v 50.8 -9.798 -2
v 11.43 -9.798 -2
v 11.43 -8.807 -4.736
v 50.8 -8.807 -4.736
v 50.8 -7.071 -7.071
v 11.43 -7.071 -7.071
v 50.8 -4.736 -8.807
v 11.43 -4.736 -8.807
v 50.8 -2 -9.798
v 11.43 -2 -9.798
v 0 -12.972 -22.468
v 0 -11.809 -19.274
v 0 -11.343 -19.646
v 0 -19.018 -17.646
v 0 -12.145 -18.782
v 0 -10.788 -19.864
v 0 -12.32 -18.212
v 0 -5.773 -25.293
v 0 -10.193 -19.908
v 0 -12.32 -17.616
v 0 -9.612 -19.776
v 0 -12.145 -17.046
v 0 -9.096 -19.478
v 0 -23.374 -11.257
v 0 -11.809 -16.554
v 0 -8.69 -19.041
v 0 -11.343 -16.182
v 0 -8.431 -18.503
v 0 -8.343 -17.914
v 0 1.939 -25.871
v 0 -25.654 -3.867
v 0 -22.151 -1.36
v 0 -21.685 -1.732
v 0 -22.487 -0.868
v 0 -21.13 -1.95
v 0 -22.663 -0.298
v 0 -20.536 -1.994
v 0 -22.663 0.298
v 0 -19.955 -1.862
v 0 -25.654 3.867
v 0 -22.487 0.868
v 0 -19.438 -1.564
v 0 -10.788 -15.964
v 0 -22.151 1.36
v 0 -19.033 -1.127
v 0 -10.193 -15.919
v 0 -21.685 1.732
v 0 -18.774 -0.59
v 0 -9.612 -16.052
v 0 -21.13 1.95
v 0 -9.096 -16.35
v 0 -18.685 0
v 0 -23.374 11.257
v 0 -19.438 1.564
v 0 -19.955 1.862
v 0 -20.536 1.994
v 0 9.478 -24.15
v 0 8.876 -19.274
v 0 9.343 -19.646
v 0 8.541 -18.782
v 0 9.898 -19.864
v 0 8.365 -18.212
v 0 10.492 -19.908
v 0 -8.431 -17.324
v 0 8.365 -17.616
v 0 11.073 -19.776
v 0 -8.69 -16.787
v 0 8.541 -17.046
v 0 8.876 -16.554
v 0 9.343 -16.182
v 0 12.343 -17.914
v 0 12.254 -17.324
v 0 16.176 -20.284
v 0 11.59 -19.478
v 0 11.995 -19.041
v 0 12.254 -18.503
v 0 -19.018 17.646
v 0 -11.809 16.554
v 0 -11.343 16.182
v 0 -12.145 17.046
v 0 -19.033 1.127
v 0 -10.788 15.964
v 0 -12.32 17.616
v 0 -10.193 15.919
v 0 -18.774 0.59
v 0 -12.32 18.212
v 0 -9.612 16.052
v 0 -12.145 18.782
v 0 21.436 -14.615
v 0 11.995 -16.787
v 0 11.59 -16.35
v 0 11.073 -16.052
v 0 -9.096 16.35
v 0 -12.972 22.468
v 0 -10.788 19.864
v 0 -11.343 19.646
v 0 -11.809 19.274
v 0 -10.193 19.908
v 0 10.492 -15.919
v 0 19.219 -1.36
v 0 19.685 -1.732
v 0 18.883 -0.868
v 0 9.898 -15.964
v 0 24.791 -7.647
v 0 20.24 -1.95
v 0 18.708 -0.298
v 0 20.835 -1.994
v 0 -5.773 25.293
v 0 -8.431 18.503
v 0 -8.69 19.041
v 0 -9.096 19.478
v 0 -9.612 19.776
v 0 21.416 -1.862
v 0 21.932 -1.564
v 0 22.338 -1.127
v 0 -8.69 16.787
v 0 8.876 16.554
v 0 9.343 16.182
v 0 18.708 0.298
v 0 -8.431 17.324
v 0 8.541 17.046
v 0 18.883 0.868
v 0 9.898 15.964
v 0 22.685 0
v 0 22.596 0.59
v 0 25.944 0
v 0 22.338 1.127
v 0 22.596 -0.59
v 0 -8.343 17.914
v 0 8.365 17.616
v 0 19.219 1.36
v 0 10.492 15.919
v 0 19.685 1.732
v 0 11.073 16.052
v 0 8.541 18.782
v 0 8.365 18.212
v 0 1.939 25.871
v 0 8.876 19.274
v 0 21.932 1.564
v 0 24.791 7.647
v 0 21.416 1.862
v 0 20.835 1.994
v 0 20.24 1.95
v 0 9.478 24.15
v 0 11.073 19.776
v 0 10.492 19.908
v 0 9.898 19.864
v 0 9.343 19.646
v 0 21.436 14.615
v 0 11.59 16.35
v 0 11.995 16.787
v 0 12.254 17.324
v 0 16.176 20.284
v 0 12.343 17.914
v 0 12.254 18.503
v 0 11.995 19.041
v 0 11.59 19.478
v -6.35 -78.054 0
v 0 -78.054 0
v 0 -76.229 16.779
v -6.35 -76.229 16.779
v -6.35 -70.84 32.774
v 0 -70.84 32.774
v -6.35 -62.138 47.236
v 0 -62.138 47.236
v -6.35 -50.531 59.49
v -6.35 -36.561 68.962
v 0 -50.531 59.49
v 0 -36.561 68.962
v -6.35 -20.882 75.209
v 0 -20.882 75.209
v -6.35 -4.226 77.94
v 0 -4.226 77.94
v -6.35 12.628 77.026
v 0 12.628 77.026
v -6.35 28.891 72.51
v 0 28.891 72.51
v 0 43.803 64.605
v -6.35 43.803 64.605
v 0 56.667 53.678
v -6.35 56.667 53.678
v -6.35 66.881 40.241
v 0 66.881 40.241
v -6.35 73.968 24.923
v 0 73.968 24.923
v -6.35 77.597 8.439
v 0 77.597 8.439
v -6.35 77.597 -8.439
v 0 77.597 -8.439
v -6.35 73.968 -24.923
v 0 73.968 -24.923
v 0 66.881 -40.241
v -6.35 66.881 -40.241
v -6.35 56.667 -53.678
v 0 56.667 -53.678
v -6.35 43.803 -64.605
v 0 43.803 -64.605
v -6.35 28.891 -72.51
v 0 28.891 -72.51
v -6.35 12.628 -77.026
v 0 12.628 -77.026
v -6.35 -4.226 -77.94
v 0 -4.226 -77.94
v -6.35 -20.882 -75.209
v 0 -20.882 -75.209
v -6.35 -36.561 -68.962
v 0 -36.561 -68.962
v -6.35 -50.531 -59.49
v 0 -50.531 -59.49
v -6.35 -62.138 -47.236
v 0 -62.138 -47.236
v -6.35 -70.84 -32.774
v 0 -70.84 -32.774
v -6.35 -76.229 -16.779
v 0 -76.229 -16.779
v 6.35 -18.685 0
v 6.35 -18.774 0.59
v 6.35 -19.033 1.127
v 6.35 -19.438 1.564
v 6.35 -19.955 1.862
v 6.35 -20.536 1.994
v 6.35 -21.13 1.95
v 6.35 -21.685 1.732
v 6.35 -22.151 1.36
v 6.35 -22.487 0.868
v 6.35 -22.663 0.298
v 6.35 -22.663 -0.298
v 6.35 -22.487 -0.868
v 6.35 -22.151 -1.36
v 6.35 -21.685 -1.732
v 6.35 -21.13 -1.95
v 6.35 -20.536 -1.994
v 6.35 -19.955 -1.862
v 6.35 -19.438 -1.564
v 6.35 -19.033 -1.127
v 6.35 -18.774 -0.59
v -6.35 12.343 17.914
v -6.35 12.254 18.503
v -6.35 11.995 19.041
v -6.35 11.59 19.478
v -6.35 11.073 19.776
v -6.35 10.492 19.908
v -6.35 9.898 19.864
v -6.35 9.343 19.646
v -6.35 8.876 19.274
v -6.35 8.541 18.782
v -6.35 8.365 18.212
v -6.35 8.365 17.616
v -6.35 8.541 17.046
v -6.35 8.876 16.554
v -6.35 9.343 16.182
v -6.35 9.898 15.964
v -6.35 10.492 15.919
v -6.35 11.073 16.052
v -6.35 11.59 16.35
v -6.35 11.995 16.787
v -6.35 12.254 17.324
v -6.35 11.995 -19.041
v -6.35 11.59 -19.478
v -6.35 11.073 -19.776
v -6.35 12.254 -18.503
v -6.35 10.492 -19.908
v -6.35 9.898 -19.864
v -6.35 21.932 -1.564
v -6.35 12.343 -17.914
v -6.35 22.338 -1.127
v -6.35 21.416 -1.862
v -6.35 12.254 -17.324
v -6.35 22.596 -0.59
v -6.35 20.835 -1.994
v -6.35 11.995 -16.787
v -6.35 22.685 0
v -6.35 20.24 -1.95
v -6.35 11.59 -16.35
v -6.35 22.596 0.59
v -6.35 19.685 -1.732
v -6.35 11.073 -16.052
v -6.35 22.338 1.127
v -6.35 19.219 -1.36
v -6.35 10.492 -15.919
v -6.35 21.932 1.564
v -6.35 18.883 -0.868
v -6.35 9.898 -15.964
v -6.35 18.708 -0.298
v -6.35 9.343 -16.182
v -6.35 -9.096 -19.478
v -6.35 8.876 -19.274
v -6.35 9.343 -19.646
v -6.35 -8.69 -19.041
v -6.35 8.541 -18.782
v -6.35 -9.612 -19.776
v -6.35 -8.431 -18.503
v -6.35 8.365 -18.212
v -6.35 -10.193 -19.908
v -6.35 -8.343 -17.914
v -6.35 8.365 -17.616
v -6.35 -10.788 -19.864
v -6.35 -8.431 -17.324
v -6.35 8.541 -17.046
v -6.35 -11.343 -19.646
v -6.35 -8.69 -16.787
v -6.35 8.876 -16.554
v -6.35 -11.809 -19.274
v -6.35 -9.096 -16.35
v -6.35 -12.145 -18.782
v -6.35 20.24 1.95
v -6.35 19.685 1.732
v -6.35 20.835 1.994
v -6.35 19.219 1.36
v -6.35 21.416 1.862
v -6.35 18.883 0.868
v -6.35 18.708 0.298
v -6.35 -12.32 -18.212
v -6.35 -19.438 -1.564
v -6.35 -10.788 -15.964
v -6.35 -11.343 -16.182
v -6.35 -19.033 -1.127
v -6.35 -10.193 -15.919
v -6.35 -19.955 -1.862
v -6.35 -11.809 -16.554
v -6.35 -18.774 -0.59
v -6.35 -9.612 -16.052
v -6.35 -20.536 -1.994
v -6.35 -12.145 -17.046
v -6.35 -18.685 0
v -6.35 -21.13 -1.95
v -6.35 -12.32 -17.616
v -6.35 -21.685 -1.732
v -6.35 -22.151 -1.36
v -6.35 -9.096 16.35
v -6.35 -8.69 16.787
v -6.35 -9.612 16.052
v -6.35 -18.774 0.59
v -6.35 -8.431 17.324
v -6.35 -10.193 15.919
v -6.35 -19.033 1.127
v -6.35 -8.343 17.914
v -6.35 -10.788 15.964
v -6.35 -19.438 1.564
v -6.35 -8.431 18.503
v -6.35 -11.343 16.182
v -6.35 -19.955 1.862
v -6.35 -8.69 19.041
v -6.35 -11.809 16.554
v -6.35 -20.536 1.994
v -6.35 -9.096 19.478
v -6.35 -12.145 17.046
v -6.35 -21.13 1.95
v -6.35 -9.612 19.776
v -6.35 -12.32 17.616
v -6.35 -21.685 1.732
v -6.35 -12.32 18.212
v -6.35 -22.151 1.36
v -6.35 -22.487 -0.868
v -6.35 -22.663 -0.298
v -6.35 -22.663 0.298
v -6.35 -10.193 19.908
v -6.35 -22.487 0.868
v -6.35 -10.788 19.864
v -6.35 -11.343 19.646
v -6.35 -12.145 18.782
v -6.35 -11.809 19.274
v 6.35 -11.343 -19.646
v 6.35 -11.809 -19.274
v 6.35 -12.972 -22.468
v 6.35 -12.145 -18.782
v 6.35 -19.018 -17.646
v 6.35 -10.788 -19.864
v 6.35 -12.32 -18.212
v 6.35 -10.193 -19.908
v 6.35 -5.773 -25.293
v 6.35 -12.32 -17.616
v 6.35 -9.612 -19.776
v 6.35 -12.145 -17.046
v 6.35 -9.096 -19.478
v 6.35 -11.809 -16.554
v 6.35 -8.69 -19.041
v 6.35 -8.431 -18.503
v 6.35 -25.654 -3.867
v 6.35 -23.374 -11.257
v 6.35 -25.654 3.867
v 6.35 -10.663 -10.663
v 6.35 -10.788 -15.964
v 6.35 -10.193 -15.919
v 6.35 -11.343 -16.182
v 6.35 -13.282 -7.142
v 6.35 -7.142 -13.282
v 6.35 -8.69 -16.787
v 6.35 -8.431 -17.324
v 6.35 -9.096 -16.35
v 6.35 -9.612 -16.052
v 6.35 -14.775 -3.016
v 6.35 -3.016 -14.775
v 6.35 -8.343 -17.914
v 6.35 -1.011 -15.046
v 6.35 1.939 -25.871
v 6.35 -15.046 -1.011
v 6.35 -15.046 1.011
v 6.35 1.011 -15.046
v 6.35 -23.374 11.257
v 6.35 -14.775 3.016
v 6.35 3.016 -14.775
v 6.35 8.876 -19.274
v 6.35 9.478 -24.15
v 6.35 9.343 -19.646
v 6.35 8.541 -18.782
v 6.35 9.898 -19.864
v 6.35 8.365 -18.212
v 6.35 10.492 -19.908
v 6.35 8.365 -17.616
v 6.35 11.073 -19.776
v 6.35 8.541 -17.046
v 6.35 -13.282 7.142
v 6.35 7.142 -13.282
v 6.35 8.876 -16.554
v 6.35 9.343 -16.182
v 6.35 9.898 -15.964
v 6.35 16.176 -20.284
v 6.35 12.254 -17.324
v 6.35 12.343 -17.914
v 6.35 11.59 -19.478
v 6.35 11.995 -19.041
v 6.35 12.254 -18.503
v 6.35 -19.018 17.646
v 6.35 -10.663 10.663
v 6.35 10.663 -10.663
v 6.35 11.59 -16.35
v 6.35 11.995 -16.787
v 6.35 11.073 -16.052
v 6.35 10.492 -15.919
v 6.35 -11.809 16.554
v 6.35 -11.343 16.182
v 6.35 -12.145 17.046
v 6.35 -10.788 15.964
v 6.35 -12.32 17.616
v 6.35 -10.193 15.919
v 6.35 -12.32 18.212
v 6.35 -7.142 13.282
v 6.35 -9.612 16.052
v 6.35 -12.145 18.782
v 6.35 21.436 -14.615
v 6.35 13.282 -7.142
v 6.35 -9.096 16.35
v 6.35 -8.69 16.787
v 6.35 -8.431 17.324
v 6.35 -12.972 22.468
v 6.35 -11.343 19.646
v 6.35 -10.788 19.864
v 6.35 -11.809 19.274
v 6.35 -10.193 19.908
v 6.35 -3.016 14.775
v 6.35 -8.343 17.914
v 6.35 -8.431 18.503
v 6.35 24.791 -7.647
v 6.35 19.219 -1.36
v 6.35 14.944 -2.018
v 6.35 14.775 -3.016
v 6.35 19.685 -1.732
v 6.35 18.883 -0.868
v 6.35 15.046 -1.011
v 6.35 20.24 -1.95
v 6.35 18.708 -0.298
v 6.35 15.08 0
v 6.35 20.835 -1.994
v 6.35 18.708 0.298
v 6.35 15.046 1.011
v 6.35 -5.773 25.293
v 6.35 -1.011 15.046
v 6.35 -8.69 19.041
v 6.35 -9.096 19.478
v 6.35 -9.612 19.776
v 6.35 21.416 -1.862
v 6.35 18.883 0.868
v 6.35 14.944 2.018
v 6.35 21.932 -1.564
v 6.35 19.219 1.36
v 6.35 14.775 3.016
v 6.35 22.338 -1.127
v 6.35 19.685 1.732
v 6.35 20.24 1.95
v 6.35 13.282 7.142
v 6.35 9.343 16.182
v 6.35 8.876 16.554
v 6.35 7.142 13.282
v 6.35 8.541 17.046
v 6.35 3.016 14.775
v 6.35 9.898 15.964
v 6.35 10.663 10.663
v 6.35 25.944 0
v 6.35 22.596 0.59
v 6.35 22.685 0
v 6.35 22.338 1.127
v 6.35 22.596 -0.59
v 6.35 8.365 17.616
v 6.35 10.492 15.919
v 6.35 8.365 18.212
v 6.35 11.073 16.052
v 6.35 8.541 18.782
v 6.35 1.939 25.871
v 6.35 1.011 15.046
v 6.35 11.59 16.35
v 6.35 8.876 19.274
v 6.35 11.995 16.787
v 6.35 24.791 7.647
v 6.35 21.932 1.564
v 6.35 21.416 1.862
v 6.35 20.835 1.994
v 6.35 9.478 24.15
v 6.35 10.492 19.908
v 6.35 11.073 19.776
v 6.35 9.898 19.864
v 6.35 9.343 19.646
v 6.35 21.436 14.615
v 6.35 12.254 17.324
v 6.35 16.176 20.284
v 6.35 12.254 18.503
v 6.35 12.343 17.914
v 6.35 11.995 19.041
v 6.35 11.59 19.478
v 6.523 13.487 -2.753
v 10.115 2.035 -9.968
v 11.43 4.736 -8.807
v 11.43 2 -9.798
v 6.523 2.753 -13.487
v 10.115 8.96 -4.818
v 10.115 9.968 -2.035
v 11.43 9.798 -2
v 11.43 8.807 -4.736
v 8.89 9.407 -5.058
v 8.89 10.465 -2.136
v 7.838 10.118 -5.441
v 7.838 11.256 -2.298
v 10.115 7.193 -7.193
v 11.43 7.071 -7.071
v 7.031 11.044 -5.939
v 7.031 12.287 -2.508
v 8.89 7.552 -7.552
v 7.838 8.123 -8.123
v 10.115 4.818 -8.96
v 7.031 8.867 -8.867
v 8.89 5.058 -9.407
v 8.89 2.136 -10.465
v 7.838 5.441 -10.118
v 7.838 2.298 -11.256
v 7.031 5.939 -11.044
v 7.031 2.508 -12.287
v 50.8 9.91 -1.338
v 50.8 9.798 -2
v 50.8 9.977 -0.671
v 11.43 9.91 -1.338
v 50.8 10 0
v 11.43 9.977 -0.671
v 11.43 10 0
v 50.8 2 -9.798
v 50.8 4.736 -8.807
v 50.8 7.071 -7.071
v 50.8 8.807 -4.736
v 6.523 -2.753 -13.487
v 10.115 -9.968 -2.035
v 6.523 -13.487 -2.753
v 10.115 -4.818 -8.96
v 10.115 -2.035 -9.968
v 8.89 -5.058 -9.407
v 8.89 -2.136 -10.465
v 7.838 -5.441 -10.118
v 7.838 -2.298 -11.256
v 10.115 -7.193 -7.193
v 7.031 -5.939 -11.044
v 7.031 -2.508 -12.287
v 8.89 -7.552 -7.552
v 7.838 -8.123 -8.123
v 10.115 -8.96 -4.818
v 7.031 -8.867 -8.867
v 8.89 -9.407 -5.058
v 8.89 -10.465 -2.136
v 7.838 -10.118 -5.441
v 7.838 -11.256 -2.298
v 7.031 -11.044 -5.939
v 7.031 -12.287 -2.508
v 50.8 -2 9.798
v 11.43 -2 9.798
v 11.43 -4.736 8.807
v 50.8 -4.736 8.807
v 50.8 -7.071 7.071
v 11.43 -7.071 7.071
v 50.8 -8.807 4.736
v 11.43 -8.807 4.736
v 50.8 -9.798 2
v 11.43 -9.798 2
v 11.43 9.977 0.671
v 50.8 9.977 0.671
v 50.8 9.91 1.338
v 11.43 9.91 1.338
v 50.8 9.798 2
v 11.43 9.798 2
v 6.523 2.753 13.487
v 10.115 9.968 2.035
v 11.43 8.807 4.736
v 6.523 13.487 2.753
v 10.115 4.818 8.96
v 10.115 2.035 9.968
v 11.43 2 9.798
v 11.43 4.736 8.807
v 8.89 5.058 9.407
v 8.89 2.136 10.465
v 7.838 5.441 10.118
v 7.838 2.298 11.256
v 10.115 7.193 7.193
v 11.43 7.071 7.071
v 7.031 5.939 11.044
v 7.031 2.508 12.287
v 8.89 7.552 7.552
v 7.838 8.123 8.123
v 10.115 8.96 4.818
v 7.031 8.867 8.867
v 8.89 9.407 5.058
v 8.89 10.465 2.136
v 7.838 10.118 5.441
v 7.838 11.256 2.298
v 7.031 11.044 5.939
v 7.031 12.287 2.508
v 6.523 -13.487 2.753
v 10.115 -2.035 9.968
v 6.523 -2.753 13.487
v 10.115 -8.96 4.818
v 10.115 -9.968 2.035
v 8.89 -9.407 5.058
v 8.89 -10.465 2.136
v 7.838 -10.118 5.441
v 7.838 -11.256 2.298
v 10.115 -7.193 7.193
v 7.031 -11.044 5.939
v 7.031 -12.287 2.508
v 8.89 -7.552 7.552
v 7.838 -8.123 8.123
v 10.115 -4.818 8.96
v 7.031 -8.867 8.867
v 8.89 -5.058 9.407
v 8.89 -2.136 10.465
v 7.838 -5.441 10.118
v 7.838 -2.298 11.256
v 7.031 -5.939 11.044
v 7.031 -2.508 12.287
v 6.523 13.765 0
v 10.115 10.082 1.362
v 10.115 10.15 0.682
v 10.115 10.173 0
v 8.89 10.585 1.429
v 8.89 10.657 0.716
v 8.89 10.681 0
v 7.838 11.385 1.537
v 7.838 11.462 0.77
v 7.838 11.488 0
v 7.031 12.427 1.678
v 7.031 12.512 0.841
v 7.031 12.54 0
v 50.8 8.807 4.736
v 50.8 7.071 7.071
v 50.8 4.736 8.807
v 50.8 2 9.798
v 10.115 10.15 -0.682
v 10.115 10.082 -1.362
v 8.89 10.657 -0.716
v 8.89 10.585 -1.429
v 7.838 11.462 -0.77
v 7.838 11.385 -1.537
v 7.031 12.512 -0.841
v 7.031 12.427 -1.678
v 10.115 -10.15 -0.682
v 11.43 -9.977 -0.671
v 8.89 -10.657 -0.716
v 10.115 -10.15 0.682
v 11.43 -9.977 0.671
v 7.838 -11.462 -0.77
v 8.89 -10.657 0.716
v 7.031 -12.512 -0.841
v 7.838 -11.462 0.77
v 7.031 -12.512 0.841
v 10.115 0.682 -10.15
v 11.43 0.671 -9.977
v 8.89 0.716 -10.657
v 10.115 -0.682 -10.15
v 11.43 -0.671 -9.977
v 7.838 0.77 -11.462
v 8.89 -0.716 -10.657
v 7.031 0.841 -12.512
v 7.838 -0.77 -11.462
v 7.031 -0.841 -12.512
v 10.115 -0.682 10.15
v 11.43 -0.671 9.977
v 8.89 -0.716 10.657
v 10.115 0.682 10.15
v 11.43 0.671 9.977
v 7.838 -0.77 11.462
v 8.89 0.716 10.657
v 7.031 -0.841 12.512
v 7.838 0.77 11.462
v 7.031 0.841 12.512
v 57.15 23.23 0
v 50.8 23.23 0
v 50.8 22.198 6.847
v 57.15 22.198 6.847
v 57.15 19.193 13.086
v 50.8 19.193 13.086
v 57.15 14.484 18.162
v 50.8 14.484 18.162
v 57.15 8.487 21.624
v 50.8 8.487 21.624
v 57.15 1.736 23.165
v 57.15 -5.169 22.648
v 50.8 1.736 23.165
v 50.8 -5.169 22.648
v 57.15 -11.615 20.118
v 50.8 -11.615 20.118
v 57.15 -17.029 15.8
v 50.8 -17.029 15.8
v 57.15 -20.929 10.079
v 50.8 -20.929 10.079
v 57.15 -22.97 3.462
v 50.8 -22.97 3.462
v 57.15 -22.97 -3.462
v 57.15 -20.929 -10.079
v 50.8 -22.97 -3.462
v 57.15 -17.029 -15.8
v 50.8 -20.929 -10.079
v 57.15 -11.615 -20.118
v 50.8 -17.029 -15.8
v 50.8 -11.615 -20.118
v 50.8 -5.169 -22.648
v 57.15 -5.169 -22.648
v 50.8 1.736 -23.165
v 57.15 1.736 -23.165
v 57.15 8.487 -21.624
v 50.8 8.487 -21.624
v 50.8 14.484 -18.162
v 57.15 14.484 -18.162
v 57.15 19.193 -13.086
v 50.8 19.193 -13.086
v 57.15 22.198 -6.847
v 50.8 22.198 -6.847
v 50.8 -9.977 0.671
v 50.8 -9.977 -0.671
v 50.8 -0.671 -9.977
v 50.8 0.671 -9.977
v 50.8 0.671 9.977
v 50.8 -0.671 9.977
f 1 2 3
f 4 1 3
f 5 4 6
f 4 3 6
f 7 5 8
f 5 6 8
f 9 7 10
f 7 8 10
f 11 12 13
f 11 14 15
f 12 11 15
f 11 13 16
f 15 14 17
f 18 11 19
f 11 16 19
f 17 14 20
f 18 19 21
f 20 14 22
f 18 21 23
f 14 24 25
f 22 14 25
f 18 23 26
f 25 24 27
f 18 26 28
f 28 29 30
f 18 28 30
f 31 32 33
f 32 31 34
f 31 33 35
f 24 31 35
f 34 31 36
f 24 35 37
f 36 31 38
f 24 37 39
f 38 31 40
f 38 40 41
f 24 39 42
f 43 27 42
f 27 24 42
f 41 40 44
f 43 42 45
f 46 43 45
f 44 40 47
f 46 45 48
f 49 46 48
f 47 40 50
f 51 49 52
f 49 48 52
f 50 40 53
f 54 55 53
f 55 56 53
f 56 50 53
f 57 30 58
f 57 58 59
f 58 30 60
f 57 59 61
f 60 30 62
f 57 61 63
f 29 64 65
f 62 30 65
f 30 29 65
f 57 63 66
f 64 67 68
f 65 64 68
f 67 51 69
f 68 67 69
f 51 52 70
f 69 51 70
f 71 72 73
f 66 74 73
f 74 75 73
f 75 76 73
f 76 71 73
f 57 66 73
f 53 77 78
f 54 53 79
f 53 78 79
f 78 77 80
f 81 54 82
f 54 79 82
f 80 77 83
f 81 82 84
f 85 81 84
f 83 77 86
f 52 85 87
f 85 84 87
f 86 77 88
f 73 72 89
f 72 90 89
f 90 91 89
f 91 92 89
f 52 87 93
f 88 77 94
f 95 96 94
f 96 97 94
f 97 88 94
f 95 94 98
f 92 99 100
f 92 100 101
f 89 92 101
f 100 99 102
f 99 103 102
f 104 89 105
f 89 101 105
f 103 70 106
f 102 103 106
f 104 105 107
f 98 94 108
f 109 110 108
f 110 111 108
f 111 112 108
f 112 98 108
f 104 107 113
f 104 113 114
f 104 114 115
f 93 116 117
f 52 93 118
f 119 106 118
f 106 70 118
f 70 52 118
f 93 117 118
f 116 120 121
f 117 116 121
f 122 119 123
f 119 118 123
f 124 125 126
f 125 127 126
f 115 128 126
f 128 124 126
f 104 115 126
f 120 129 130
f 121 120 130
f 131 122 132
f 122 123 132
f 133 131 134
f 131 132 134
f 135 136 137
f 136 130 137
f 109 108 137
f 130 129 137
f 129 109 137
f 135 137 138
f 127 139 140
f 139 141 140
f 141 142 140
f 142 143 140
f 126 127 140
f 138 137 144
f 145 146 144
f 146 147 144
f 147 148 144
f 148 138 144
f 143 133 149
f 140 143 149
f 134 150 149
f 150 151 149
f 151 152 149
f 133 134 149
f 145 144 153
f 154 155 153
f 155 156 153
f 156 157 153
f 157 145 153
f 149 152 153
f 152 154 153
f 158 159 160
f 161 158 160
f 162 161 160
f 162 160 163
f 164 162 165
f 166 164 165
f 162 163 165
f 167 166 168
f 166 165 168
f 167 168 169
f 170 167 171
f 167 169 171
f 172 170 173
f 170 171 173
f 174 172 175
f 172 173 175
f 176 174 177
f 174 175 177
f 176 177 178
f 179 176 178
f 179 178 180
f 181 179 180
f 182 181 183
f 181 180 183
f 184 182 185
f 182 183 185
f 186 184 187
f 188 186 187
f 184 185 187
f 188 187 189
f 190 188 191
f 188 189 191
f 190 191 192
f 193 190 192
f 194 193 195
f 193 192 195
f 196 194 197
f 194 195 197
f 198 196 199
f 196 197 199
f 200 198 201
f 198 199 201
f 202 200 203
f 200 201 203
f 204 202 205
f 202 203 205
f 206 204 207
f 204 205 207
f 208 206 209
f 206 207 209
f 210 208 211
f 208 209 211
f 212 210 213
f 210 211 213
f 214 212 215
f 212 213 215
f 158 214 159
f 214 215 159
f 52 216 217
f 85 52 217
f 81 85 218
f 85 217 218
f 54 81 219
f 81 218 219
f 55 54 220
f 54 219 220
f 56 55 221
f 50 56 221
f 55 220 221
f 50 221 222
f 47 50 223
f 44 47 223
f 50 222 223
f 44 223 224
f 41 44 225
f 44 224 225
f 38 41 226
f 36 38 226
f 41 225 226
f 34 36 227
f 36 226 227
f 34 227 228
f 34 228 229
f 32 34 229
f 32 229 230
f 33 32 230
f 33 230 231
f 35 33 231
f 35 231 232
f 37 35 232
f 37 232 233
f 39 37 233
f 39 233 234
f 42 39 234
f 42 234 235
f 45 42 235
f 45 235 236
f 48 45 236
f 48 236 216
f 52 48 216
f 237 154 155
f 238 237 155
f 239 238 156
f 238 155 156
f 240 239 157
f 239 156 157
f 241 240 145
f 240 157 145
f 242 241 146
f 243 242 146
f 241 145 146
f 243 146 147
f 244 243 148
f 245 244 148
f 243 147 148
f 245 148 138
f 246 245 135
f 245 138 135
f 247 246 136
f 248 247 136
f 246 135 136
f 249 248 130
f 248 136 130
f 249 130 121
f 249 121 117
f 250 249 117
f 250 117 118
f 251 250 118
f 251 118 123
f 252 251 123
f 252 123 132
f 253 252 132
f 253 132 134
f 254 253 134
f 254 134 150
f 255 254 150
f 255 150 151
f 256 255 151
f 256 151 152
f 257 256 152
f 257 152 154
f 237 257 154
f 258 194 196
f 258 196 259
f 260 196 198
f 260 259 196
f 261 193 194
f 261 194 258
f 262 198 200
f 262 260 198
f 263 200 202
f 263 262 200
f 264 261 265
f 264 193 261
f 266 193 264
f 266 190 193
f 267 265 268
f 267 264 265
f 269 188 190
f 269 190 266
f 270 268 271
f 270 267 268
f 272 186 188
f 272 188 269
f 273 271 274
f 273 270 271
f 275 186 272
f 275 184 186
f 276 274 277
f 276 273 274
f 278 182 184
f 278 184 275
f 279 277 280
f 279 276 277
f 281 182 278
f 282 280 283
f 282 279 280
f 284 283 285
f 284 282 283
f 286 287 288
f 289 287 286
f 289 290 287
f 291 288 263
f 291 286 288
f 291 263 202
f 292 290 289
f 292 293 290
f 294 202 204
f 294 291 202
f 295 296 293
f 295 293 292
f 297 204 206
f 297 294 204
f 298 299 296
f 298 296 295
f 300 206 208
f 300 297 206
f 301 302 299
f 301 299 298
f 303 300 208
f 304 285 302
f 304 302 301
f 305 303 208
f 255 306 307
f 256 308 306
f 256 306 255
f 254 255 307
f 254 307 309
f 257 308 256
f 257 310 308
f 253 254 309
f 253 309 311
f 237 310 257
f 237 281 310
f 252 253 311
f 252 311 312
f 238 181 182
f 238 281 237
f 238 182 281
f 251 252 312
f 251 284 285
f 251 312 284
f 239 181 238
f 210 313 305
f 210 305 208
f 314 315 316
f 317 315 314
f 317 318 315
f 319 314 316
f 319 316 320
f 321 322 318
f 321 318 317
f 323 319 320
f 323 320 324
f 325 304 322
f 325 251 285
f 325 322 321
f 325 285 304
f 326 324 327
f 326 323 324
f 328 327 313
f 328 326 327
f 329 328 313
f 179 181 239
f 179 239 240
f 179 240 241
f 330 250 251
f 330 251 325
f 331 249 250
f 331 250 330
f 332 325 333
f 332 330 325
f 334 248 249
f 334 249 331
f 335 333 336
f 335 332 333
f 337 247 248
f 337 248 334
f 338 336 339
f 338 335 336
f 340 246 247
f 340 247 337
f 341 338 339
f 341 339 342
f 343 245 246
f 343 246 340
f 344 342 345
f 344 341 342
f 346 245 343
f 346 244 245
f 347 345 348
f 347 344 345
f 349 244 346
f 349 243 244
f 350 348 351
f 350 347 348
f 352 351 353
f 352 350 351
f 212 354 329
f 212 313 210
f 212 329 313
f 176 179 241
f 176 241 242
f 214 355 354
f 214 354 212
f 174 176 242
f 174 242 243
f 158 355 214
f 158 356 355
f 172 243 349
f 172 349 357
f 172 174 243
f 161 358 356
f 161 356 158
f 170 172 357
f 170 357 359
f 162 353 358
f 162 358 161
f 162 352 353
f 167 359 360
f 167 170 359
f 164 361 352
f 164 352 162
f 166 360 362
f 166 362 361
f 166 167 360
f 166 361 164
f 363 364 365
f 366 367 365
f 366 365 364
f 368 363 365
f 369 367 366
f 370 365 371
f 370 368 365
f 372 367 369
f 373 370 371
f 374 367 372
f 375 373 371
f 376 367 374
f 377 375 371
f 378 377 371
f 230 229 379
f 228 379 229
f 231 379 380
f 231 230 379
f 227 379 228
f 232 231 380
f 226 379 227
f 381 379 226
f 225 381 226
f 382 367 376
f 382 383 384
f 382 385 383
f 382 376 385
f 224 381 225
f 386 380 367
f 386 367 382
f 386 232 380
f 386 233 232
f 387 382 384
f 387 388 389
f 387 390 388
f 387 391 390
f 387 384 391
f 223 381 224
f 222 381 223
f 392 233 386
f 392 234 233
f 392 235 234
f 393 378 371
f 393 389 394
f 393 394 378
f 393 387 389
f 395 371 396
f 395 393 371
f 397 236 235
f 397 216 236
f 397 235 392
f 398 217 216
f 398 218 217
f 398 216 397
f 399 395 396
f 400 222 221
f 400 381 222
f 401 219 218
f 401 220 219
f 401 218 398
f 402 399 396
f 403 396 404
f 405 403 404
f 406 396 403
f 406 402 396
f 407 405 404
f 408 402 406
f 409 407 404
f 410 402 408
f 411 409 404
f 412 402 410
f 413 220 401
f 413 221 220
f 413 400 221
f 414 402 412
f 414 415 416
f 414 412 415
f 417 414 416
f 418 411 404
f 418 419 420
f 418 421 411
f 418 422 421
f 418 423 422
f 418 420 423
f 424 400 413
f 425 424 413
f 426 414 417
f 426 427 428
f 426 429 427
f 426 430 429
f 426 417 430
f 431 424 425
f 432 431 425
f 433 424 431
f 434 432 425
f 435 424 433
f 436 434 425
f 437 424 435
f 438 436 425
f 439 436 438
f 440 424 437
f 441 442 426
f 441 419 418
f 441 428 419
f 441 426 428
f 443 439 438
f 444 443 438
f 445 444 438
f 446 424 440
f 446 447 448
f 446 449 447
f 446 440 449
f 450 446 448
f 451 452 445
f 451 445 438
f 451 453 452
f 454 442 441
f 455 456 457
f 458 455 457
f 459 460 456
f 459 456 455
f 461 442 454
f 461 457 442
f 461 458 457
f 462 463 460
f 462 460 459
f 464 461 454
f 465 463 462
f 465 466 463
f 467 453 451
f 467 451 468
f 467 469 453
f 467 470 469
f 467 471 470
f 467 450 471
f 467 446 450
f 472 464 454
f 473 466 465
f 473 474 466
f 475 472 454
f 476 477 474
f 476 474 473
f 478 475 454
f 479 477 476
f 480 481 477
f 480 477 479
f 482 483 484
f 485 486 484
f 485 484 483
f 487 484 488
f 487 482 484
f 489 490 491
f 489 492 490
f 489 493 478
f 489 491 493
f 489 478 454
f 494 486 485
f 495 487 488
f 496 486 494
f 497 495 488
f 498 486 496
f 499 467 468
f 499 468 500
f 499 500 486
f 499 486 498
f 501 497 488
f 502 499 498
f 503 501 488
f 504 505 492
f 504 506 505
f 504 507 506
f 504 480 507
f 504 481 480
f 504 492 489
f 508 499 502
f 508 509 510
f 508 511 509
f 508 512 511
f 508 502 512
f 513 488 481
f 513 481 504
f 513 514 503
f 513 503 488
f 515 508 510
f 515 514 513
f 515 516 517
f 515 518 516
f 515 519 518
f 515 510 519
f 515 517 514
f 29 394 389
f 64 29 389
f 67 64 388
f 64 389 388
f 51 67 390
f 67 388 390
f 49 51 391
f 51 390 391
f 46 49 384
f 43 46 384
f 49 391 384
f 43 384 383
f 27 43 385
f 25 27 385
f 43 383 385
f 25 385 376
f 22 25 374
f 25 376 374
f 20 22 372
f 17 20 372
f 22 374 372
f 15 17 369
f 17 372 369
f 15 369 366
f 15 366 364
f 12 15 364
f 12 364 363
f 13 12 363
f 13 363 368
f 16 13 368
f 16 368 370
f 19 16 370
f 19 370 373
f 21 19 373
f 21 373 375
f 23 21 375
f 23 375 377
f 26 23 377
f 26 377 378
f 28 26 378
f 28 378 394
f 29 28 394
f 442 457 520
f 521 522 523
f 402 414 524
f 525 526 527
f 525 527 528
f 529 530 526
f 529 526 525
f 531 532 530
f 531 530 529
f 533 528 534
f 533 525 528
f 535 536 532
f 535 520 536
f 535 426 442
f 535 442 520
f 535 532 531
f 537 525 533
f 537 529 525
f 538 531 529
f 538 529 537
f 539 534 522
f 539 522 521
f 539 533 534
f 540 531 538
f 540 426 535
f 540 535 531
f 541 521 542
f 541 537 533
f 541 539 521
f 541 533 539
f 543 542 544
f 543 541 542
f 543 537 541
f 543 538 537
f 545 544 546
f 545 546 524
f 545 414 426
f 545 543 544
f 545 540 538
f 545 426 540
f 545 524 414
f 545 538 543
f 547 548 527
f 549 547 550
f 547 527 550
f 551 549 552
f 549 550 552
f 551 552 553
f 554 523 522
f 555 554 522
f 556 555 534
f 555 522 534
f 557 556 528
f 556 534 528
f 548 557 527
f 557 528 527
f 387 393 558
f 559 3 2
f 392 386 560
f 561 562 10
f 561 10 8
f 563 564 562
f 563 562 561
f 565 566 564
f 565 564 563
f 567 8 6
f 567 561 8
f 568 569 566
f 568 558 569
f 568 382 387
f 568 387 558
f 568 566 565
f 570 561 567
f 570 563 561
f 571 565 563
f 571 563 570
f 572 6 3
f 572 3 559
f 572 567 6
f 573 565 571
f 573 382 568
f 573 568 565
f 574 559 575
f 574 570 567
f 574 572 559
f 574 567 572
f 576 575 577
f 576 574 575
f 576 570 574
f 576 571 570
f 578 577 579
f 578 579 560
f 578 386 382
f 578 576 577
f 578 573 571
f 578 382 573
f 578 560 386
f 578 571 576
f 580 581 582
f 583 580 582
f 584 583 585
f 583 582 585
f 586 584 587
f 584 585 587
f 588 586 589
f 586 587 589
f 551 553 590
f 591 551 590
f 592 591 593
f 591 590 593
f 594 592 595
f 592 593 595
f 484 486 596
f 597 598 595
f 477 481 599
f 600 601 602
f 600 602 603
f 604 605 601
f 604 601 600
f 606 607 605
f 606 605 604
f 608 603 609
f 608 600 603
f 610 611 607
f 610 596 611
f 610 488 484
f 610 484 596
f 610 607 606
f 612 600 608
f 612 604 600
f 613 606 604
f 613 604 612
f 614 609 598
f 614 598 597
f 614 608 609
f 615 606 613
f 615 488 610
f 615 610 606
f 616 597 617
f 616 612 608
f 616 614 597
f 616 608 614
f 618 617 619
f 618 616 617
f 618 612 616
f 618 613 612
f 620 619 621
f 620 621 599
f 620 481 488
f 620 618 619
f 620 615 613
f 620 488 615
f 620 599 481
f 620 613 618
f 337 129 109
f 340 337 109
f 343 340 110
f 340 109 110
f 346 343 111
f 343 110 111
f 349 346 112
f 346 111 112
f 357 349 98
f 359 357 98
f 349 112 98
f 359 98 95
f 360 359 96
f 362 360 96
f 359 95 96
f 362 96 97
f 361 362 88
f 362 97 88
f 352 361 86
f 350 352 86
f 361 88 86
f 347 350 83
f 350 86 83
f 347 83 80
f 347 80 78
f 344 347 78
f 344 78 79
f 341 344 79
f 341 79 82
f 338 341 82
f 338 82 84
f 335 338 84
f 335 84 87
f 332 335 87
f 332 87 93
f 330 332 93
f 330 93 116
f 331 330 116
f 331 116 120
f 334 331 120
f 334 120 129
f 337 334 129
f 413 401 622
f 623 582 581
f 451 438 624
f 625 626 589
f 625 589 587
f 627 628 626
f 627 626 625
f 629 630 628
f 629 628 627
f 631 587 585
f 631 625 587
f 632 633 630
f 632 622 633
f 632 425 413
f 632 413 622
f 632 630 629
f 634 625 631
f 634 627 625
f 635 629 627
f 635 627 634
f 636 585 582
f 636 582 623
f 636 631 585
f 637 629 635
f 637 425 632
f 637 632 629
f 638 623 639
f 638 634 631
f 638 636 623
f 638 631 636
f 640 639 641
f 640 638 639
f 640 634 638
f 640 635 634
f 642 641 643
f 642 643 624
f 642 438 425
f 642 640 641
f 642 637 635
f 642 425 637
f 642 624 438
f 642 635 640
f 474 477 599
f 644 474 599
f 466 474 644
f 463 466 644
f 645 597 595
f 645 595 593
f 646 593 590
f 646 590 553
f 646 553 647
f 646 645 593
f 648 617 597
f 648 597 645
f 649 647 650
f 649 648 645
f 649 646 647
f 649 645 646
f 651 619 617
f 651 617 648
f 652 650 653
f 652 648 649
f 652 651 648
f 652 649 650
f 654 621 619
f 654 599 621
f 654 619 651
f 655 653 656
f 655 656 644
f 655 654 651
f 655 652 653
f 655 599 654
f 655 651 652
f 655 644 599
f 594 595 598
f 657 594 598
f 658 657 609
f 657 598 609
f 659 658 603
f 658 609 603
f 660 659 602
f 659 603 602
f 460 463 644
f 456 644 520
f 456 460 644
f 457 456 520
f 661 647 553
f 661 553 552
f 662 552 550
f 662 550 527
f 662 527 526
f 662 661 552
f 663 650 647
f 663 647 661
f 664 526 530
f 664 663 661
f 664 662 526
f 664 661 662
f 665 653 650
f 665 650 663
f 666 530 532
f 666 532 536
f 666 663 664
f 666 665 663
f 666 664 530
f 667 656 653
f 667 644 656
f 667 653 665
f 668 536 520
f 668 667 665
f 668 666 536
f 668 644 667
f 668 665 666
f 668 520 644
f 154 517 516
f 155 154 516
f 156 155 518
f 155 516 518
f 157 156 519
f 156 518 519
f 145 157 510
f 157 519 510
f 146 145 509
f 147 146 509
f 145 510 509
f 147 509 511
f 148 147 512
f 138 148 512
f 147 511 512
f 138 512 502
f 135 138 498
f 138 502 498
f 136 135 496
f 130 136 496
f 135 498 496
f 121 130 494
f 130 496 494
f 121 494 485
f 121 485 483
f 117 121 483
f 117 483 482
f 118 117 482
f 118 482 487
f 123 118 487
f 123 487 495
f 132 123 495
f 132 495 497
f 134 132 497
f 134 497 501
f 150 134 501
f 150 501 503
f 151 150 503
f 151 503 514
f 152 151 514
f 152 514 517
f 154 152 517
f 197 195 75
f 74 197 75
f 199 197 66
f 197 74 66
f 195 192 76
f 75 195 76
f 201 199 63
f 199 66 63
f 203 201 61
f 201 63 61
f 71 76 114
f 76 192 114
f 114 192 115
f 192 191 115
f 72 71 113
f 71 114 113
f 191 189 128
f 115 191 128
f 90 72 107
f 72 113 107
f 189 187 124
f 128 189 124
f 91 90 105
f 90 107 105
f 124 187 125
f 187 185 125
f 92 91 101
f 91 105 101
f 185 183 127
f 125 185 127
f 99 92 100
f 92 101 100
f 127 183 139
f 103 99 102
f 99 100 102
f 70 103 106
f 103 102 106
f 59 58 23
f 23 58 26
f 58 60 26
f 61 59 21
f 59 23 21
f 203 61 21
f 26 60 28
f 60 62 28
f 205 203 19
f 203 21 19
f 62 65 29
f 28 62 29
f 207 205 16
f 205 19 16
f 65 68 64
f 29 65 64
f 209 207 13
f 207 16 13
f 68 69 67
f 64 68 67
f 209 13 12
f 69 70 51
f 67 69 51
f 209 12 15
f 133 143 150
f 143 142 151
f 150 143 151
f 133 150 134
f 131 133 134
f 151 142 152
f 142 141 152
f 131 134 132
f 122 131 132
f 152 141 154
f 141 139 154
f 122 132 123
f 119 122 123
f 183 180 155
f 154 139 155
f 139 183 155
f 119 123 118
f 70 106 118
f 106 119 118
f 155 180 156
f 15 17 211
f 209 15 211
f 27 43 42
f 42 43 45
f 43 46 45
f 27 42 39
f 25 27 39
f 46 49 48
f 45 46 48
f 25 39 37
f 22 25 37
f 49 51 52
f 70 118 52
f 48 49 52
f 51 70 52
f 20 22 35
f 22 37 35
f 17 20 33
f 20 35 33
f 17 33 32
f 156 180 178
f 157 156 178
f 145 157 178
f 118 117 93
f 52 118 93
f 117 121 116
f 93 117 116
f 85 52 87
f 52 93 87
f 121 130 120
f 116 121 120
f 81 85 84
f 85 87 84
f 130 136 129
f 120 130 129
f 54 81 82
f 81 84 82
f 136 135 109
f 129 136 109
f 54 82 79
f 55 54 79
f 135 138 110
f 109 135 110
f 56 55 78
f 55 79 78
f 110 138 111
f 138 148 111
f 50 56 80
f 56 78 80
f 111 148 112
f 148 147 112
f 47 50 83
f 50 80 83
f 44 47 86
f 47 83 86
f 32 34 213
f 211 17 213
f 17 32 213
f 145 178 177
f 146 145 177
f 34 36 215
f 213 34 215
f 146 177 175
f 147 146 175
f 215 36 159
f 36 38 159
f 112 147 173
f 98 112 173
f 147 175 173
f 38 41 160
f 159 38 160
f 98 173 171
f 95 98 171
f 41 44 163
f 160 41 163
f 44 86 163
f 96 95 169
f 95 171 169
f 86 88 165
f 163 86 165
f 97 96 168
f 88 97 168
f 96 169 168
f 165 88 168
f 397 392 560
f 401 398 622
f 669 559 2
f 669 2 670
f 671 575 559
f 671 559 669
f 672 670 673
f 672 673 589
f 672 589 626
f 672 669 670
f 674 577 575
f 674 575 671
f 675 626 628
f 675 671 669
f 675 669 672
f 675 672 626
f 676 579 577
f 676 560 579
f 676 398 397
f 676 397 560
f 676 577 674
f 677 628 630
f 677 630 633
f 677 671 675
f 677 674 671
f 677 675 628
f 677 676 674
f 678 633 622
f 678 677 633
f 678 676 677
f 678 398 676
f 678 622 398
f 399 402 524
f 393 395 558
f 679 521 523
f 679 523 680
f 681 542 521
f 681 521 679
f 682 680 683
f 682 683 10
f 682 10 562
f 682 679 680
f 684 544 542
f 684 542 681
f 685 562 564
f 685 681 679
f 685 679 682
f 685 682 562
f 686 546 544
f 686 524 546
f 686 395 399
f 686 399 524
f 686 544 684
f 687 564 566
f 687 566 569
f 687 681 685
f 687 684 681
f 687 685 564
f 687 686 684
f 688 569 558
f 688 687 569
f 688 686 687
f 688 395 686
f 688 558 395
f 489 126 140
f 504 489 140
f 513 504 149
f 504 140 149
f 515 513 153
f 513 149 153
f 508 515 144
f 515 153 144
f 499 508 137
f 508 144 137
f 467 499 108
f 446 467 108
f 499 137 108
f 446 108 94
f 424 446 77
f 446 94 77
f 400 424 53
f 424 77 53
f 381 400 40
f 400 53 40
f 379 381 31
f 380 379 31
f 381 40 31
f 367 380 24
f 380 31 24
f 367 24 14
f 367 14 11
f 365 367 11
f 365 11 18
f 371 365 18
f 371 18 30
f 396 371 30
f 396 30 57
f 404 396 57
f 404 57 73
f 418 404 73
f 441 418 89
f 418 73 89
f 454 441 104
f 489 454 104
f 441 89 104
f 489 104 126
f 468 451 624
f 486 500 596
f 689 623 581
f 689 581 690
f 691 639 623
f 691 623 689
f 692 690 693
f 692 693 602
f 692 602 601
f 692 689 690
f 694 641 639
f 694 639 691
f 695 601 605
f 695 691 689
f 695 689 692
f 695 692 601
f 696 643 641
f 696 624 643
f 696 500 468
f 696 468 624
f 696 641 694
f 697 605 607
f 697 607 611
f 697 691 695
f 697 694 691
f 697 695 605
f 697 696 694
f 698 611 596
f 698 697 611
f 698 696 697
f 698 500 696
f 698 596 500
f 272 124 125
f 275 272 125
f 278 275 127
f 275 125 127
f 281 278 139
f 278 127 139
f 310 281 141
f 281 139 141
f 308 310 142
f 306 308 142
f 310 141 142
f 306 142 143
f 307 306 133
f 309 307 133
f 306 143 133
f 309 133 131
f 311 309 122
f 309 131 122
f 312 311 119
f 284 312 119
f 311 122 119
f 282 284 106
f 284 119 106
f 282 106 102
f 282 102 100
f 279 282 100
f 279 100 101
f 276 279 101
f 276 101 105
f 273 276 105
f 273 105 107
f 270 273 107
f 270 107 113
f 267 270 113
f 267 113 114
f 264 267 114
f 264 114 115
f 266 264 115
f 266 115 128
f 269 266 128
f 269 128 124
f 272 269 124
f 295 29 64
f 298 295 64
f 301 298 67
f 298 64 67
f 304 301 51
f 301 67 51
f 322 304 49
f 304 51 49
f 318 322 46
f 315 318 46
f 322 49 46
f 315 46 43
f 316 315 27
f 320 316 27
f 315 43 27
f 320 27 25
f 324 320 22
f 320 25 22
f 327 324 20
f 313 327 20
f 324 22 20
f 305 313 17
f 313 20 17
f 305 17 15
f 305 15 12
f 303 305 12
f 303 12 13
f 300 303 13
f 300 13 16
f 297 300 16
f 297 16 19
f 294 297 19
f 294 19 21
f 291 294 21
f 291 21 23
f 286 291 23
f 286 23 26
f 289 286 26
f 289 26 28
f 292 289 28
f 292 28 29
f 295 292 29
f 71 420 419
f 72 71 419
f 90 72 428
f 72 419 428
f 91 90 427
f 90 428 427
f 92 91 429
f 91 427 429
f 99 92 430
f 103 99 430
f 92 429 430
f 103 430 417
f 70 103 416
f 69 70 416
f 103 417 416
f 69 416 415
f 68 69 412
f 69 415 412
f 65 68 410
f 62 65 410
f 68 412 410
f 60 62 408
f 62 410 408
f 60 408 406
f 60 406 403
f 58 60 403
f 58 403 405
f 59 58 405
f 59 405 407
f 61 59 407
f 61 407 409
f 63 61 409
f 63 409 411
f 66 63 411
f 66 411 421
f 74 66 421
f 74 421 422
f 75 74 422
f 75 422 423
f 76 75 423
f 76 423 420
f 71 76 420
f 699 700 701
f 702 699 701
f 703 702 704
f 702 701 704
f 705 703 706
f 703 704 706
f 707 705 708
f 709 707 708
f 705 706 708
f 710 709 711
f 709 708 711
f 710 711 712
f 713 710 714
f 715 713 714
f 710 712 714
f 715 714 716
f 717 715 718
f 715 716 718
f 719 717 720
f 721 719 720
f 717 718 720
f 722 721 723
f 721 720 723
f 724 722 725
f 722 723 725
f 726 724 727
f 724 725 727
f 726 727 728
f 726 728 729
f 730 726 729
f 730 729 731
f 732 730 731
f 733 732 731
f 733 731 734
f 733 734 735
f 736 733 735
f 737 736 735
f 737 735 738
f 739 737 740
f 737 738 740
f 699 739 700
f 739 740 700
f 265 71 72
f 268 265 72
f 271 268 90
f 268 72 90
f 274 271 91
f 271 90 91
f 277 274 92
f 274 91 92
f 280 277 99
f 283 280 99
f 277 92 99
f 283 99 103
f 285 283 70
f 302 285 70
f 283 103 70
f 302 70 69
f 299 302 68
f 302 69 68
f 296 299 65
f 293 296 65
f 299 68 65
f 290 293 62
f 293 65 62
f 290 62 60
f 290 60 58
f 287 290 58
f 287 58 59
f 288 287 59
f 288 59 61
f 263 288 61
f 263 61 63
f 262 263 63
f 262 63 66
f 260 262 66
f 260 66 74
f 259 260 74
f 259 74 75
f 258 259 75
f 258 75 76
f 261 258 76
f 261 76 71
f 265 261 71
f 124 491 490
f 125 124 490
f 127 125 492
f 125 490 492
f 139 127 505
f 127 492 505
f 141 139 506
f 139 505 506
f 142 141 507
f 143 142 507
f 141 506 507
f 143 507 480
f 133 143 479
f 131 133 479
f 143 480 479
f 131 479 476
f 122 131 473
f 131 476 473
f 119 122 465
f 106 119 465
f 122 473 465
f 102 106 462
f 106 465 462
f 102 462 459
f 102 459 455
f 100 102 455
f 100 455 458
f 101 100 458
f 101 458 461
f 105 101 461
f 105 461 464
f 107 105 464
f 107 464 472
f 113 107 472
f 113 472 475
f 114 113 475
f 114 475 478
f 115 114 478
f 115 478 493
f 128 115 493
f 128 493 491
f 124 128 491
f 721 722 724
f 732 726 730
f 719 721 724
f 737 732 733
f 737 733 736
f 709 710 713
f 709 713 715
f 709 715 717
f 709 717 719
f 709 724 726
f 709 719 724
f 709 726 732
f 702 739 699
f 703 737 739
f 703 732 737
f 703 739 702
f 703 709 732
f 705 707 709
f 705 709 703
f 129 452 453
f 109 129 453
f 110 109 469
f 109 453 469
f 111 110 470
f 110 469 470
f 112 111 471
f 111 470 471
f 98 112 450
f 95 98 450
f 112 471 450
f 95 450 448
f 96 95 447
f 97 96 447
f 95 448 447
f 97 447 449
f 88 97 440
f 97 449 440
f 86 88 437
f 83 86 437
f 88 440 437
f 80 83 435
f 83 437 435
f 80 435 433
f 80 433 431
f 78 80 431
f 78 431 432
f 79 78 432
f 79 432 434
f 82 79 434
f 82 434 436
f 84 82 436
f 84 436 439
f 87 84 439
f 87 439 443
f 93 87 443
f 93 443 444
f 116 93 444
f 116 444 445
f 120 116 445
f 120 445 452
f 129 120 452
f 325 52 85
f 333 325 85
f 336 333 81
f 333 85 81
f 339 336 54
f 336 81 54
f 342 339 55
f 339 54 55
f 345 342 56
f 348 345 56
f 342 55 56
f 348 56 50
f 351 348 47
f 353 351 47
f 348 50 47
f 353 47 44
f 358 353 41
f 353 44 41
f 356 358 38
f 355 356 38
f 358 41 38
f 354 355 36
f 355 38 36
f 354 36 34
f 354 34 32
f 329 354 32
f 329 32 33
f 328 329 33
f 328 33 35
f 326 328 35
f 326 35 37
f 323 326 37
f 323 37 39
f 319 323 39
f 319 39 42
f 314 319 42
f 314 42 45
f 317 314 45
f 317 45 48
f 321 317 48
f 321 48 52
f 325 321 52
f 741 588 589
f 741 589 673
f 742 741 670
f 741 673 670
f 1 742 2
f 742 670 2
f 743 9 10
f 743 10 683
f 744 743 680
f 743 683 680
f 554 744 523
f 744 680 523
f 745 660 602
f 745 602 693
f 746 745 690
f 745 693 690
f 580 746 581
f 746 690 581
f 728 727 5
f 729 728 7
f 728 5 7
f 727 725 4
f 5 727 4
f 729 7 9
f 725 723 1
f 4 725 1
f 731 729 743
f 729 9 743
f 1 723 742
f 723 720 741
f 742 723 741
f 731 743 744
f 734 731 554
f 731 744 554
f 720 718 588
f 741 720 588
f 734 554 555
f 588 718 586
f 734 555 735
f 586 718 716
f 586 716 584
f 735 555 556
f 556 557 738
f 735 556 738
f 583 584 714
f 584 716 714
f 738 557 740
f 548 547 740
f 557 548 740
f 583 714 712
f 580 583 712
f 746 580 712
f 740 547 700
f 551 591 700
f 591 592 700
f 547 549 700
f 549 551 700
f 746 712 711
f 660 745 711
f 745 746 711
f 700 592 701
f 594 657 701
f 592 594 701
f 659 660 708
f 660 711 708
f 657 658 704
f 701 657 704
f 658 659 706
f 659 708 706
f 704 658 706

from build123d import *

# Parameters (mm, degrees)
F0_W       = 6
F0_H       = 4
F0_W_2     = 4
F0_H_2     = 6
F1_DEPTH   = 50.8
F0_R       = 25.9436510784
F2_DEPTH   = 6.35
F3_R       = 78.0540986602
F3_R_2     = 25.9436510784
F4_DEPTH   = 6.35
F5_R       = 23.2299386705
F5_W       = 4
F5_H       = 6
F5_W_2     = 6
F5_H_2     = 4
F6_DEPTH   = 6.35
F7_R       = 5.08
F8_D       = 4
F8_DEPTH   = 57.151
F8_2_D     = 4
F8_2_DEPTH = 57.151


with BuildPart() as f1:
    # F0 (on Right) → F1 (new body)
    with BuildSketch(Plane.YZ):
        with BuildLine():
            ThreePointArc((2, -9.7979589711), (7.0710678119, -7.0710678119), (9.7979589711, -2))
            Line((9.7979589711, -2), (8, -2))
            Line((8, -2), (2, -2))
            Line((2, -2), (2, -8))
            Line((2, -8), (2, -9.7979589711))
        make_face()
        with BuildLine():
            ThreePointArc((-9.7979589711, -2), (-7.0710678119, -7.0710678119), (-2, -9.7979589711))
            Line((-2, -9.7979589711), (-2, -8))
            Line((-2, -8), (-2, -2))
            Line((-2, -2), (-8, -2))
            Line((-8, -2), (-9.7979589711, -2))
        make_face()
        with BuildLine():
            Line((-2, 8), (-2, 9.7979589711))
            ThreePointArc((-2, 9.7979589711), (-7.0710678119, 7.0710678119), (-9.7979589711, 2))
            Line((-9.7979589711, 2), (-8, 2))
            Line((-8, 2), (-2, 2))
            Line((-2, 2), (-2, 8))
        make_face()
        with BuildLine():
            Line((8, 2), (9.7979589711, 2))
            ThreePointArc((9.7979589711, 2), (7.0710678119, 7.0710678119), (2, 9.7979589711))
            Line((2, 9.7979589711), (2, 8))
            Line((2, 8), (2, 2))
            Line((2, 2), (8, 2))
        make_face()
        with Locations((5, 0)):
            Rectangle(F0_W, F0_H)
        Rectangle(F0_W_2, F0_H)
        with Locations((0, 5)):
            Rectangle(F0_W_2, F0_H_2)
        with Locations((-5, 0)):
            Rectangle(F0_W, F0_H)
        with Locations((0, -5)):
            Rectangle(F0_W_2, F0_H_2)
        with BuildLine():
            Line((-8, 2), (-9.7979589711, 2))
            ThreePointArc((-9.7979589711, 2), (-10, 0), (-9.7979589711, -2))
            Line((-9.7979589711, -2), (-8, -2))
            Line((-8, -2), (-8, 2))
        make_face()
        with BuildLine():
            ThreePointArc((-2, -9.7979589711), (0, -10), (2, -9.7979589711))
            Line((2, -9.7979589711), (2, -8))
            Line((2, -8), (-2, -8))
            Line((-2, -8), (-2, -9.7979589711))
        make_face()
        with BuildLine():
            ThreePointArc((9.7979589711, -2), (9.9493615301, -1.0050896201), (10, 0))
            ThreePointArc((10, 0), (9.9493615301, 1.0050896201), (9.7979589711, 2))
            Line((9.7979589711, 2), (8, 2))
            Line((8, 2), (8, -2))
            Line((8, -2), (9.7979589711, -2))
        make_face()
        with BuildLine():
            Line((2, 8), (2, 9.7979589711))
            ThreePointArc((2, 9.7979589711), (0, 10), (-2, 9.7979589711))
            Line((-2, 9.7979589711), (-2, 8))
            Line((-2, 8), (2, 8))
        make_face()
    extrude(amount=F1_DEPTH)

    # F0 (on Right) → F2 (join)
    with BuildSketch(Plane.YZ):
        Circle(F0_R)
        Polygon((10.3425991178, 17.9139071543), (20.6851982355, 0), (10.3425991178, -17.9139071543), (-10.3425991178, -17.9139071543), (-20.6851982355, 0), (-10.3425991178, 17.9139071543), align=None, mode=Mode.SUBTRACT)
        Polygon((10.3425991178, -17.9139071543), (20.6851982355, 0), (10.3425991178, 17.9139071543), (-10.3425991178, 17.9139071543), (-20.6851982355, 0), (-10.3425991178, -17.9139071543), align=None)
        with BuildLine():
            ThreePointArc((2, 9.7979589711), (7.0710678119, 7.0710678119), (9.7979589711, 2))
            Line((9.7979589711, 2), (12.5, 2))
            Line((12.5, 2), (12.5, -2))
            Line((12.5, -2), (9.7979589711, -2))
            ThreePointArc((9.7979589711, -2), (7.0710678119, -7.0710678119), (2, -9.7979589711))
            Line((2, -9.7979589711), (2, -12.5))
            Line((2, -12.5), (-2, -12.5))
            Line((-2, -12.5), (-2, -9.7979589711))
            ThreePointArc((-2, -9.7979589711), (-7.0710678119, -7.0710678119), (-9.7979589711, -2))
            Line((-9.7979589711, -2), (-12.5, -2))
            Line((-12.5, -2), (-12.5, 2))
            Line((-12.5, 2), (-9.7979589711, 2))
            ThreePointArc((-9.7979589711, 2), (-7.0710678119, 7.0710678119), (-2, 9.7979589711))
            Line((-2, 9.7979589711), (-2, 12.5))
            Line((-2, 12.5), (2, 12.5))
            Line((2, 12.5), (2, 9.7979589711))
        make_face(mode=Mode.SUBTRACT)
        with BuildLine():
            ThreePointArc((-2, 9.7979589711), (0, 10), (2, 9.7979589711))
            Line((2, 9.7979589711), (2, 12.5))
            Line((2, 12.5), (-2, 12.5))
            Line((-2, 12.5), (-2, 9.7979589711))
        make_face()
        with BuildLine():
            ThreePointArc((9.7979589711, 2), (9.9493615301, 1.0050896201), (10, 0))
            ThreePointArc((10, 0), (9.9493615301, -1.0050896201), (9.7979589711, -2))
            Line((9.7979589711, -2), (12.5, -2))
            Line((12.5, -2), (12.5, 2))
            Line((12.5, 2), (9.7979589711, 2))
        make_face()
        with BuildLine():
            ThreePointArc((-9.7979589711, -2), (-10, 0), (-9.7979589711, 2))
            Line((-9.7979589711, 2), (-12.5, 2))
            Line((-12.5, 2), (-12.5, -2))
            Line((-12.5, -2), (-9.7979589711, -2))
        make_face()
        with BuildLine():
            Line((2, -12.5), (2, -9.7979589711))
            ThreePointArc((2, -9.7979589711), (0, -10), (-2, -9.7979589711))
            Line((-2, -9.7979589711), (-2, -12.5))
            Line((-2, -12.5), (2, -12.5))
        make_face()
    extrude(amount=F2_DEPTH)

    # F5 (on face) → F6 (join)
    with BuildSketch(Plane.YZ.offset(50.8)):
        Circle(F5_R)
        Polygon((10.3425991178, 17.9139071543), (20.6851982355, 0), (10.3425991178, -17.9139071543), (-10.3425991178, -17.9139071543), (-20.6851982355, 0), (-10.3425991178, 17.9139071543), align=None, mode=Mode.SUBTRACT)
        Polygon((10.3425991178, -17.9139071543), (20.6851982355, 0), (10.3425991178, 17.9139071543), (-10.3425991178, 17.9139071543), (-20.6851982355, 0), (-10.3425991178, -17.9139071543), align=None)
        with BuildLine():
            ThreePointArc((2, 9.7979589711), (7.0710678119, 7.0710678119), (9.7979589711, 2))
            Line((9.7979589711, 2), (12.5, 2))
            Line((12.5, 2), (12.5, -2))
            Line((12.5, -2), (9.7979589711, -2))
            ThreePointArc((9.7979589711, -2), (7.0710678119, -7.0710678119), (2, -9.7979589711))
            Line((2, -9.7979589711), (2, -12.5))
            Line((2, -12.5), (-2, -12.5))
            Line((-2, -12.5), (-2, -9.7979589711))
            ThreePointArc((-2, -9.7979589711), (-7.0710678119, -7.0710678119), (-9.7979589711, -2))
            Line((-9.7979589711, -2), (-12.5, -2))
            Line((-12.5, -2), (-12.5, 2))
            Line((-12.5, 2), (-9.7979589711, 2))
            ThreePointArc((-9.7979589711, 2), (-7.0710678119, 7.0710678119), (-2, 9.7979589711))
            Line((-2, 9.7979589711), (-2, 12.5))
            Line((-2, 12.5), (2, 12.5))
            Line((2, 12.5), (2, 9.7979589711))
        make_face(mode=Mode.SUBTRACT)
        with BuildLine():
            Line((8, 2), (9.7979589711, 2))
            ThreePointArc((9.7979589711, 2), (7.0710678119, 7.0710678119), (2, 9.7979589711))
            Line((2, 9.7979589711), (2, 8))
            Line((2, 8), (2, 2))
            Line((2, 2), (8, 2))
        make_face()
        with BuildLine():
            ThreePointArc((2, -9.7979589711), (7.0710678119, -7.0710678119), (9.7979589711, -2))
            Line((9.7979589711, -2), (8, -2))
            Line((8, -2), (2, -2))
            Line((2, -2), (2, -8))
            Line((2, -8), (2, -9.7979589711))
        make_face()
        with BuildLine():
            ThreePointArc((-9.7979589711, -2), (-7.0710678119, -7.0710678119), (-2, -9.7979589711))
            Line((-2, -9.7979589711), (-2, -8))
            Line((-2, -8), (-2, -2))
            Line((-2, -2), (-8, -2))
            Line((-8, -2), (-9.7979589711, -2))
        make_face()
        with BuildLine():
            Line((-2, 8), (-2, 9.7979589711))
            ThreePointArc((-2, 9.7979589711), (-7.0710678119, 7.0710678119), (-9.7979589711, 2))
            Line((-9.7979589711, 2), (-8, 2))
            Line((-8, 2), (-2, 2))
            Line((-2, 2), (-2, 8))
        make_face()
        with Locations((0, 5)):
            Rectangle(F5_W, F5_H)
        with Locations((5, 0)):
            Rectangle(F5_W_2, F5_H_2)
        with Locations((0, -5)):
            Rectangle(F5_W, F5_H)
        with Locations((-5, 0)):
            Rectangle(F5_W_2, F5_H_2)
        Rectangle(F5_W, F5_H_2)
        with BuildLine():
            ThreePointArc((-2, 9.7979589711), (0, 10), (2, 9.7979589711))
            Line((2, 9.7979589711), (2, 12.5))
            Line((2, 12.5), (-2, 12.5))
            Line((-2, 12.5), (-2, 9.7979589711))
        make_face()
        with BuildLine():
            ThreePointArc((9.7979589711, 2), (9.9493615301, 1.0050896201), (10, 0))
            ThreePointArc((10, 0), (9.9493615301, -1.0050896201), (9.7979589711, -2))
            Line((9.7979589711, -2), (12.5, -2))
            Line((12.5, -2), (12.5, 2))
            Line((12.5, 2), (9.7979589711, 2))
        make_face()
        with BuildLine():
            Line((2, -12.5), (2, -9.7979589711))
            ThreePointArc((2, -9.7979589711), (0, -10), (-2, -9.7979589711))
            Line((-2, -9.7979589711), (-2, -12.5))
            Line((-2, -12.5), (2, -12.5))
        make_face()
        with BuildLine():
            ThreePointArc((-9.7979589711, -2), (-10, 0), (-9.7979589711, 2))
            Line((-9.7979589711, 2), (-12.5, 2))
            Line((-12.5, 2), (-12.5, -2))
            Line((-12.5, -2), (-9.7979589711, -2))
        make_face()
        with BuildLine():
            Line((2, 8), (2, 9.7979589711))
            ThreePointArc((2, 9.7979589711), (0, 10), (-2, 9.7979589711))
            Line((-2, 9.7979589711), (-2, 8))
            Line((-2, 8), (2, 8))
        make_face()
        with BuildLine():
            ThreePointArc((9.7979589711, -2), (9.9493615301, -1.0050896201), (10, 0))
            ThreePointArc((10, 0), (9.9493615301, 1.0050896201), (9.7979589711, 2))
            Line((9.7979589711, 2), (8, 2))
            Line((8, 2), (8, -2))
            Line((8, -2), (9.7979589711, -2))
        make_face()
        with BuildLine():
            ThreePointArc((-2, -9.7979589711), (0, -10), (2, -9.7979589711))
            Line((2, -9.7979589711), (2, -8))
            Line((2, -8), (-2, -8))
            Line((-2, -8), (-2, -9.7979589711))
        make_face()
        with BuildLine():
            Line((-8, 2), (-9.7979589711, 2))
            ThreePointArc((-9.7979589711, 2), (-10, 0), (-9.7979589711, -2))
            Line((-9.7979589711, -2), (-8, -2))
            Line((-8, -2), (-8, 2))
        make_face()
    extrude(amount=F6_DEPTH)

    # F7
    f7_edges = [f1.edges().sort_by_distance(p)[0] for p in [
        (6.35, -2, -9.797959),
    ]]
    fillet(f7_edges, radius=F7_R)

    # F8 (through all, one way)
    with BuildSketch(Plane.YZ.offset(50.8)):
        with Locations((10.3425991178, 17.9139071543), (20.6851982355, 0), (-10.3425991178, 17.9139071543), (10.3425991178, -17.9139071543), (-10.3425991178, -17.9139071543), (-20.6851982355, 0)):
            Circle(F8_D / 2)
    extrude(amount=-F8_DEPTH, mode=Mode.SUBTRACT)


with BuildPart() as f4:
    # F3 (on face) → F4 (new body)
    with BuildSketch(Plane(origin=(0, 0, 0), x_dir=(0, -1, 0), z_dir=(-1, 0, 0))):
        Circle(F3_R)
        Circle(F3_R_2, mode=Mode.SUBTRACT)
        Circle(F3_R_2)
    extrude(amount=F4_DEPTH)

    # F8#2 (through all, one way)
    with BuildSketch(Plane.YZ.offset(50.8)):
        with Locations((10.3425991178, 17.9139071543), (20.6851982355, 0), (-10.3425991178, 17.9139071543), (10.3425991178, -17.9139071543), (-10.3425991178, -17.9139071543), (-20.6851982355, 0)):
            Circle(F8_2_D / 2)
    extrude(amount=-F8_2_DEPTH, mode=Mode.SUBTRACT)


solid = Compound([f1.part, f4.part])
